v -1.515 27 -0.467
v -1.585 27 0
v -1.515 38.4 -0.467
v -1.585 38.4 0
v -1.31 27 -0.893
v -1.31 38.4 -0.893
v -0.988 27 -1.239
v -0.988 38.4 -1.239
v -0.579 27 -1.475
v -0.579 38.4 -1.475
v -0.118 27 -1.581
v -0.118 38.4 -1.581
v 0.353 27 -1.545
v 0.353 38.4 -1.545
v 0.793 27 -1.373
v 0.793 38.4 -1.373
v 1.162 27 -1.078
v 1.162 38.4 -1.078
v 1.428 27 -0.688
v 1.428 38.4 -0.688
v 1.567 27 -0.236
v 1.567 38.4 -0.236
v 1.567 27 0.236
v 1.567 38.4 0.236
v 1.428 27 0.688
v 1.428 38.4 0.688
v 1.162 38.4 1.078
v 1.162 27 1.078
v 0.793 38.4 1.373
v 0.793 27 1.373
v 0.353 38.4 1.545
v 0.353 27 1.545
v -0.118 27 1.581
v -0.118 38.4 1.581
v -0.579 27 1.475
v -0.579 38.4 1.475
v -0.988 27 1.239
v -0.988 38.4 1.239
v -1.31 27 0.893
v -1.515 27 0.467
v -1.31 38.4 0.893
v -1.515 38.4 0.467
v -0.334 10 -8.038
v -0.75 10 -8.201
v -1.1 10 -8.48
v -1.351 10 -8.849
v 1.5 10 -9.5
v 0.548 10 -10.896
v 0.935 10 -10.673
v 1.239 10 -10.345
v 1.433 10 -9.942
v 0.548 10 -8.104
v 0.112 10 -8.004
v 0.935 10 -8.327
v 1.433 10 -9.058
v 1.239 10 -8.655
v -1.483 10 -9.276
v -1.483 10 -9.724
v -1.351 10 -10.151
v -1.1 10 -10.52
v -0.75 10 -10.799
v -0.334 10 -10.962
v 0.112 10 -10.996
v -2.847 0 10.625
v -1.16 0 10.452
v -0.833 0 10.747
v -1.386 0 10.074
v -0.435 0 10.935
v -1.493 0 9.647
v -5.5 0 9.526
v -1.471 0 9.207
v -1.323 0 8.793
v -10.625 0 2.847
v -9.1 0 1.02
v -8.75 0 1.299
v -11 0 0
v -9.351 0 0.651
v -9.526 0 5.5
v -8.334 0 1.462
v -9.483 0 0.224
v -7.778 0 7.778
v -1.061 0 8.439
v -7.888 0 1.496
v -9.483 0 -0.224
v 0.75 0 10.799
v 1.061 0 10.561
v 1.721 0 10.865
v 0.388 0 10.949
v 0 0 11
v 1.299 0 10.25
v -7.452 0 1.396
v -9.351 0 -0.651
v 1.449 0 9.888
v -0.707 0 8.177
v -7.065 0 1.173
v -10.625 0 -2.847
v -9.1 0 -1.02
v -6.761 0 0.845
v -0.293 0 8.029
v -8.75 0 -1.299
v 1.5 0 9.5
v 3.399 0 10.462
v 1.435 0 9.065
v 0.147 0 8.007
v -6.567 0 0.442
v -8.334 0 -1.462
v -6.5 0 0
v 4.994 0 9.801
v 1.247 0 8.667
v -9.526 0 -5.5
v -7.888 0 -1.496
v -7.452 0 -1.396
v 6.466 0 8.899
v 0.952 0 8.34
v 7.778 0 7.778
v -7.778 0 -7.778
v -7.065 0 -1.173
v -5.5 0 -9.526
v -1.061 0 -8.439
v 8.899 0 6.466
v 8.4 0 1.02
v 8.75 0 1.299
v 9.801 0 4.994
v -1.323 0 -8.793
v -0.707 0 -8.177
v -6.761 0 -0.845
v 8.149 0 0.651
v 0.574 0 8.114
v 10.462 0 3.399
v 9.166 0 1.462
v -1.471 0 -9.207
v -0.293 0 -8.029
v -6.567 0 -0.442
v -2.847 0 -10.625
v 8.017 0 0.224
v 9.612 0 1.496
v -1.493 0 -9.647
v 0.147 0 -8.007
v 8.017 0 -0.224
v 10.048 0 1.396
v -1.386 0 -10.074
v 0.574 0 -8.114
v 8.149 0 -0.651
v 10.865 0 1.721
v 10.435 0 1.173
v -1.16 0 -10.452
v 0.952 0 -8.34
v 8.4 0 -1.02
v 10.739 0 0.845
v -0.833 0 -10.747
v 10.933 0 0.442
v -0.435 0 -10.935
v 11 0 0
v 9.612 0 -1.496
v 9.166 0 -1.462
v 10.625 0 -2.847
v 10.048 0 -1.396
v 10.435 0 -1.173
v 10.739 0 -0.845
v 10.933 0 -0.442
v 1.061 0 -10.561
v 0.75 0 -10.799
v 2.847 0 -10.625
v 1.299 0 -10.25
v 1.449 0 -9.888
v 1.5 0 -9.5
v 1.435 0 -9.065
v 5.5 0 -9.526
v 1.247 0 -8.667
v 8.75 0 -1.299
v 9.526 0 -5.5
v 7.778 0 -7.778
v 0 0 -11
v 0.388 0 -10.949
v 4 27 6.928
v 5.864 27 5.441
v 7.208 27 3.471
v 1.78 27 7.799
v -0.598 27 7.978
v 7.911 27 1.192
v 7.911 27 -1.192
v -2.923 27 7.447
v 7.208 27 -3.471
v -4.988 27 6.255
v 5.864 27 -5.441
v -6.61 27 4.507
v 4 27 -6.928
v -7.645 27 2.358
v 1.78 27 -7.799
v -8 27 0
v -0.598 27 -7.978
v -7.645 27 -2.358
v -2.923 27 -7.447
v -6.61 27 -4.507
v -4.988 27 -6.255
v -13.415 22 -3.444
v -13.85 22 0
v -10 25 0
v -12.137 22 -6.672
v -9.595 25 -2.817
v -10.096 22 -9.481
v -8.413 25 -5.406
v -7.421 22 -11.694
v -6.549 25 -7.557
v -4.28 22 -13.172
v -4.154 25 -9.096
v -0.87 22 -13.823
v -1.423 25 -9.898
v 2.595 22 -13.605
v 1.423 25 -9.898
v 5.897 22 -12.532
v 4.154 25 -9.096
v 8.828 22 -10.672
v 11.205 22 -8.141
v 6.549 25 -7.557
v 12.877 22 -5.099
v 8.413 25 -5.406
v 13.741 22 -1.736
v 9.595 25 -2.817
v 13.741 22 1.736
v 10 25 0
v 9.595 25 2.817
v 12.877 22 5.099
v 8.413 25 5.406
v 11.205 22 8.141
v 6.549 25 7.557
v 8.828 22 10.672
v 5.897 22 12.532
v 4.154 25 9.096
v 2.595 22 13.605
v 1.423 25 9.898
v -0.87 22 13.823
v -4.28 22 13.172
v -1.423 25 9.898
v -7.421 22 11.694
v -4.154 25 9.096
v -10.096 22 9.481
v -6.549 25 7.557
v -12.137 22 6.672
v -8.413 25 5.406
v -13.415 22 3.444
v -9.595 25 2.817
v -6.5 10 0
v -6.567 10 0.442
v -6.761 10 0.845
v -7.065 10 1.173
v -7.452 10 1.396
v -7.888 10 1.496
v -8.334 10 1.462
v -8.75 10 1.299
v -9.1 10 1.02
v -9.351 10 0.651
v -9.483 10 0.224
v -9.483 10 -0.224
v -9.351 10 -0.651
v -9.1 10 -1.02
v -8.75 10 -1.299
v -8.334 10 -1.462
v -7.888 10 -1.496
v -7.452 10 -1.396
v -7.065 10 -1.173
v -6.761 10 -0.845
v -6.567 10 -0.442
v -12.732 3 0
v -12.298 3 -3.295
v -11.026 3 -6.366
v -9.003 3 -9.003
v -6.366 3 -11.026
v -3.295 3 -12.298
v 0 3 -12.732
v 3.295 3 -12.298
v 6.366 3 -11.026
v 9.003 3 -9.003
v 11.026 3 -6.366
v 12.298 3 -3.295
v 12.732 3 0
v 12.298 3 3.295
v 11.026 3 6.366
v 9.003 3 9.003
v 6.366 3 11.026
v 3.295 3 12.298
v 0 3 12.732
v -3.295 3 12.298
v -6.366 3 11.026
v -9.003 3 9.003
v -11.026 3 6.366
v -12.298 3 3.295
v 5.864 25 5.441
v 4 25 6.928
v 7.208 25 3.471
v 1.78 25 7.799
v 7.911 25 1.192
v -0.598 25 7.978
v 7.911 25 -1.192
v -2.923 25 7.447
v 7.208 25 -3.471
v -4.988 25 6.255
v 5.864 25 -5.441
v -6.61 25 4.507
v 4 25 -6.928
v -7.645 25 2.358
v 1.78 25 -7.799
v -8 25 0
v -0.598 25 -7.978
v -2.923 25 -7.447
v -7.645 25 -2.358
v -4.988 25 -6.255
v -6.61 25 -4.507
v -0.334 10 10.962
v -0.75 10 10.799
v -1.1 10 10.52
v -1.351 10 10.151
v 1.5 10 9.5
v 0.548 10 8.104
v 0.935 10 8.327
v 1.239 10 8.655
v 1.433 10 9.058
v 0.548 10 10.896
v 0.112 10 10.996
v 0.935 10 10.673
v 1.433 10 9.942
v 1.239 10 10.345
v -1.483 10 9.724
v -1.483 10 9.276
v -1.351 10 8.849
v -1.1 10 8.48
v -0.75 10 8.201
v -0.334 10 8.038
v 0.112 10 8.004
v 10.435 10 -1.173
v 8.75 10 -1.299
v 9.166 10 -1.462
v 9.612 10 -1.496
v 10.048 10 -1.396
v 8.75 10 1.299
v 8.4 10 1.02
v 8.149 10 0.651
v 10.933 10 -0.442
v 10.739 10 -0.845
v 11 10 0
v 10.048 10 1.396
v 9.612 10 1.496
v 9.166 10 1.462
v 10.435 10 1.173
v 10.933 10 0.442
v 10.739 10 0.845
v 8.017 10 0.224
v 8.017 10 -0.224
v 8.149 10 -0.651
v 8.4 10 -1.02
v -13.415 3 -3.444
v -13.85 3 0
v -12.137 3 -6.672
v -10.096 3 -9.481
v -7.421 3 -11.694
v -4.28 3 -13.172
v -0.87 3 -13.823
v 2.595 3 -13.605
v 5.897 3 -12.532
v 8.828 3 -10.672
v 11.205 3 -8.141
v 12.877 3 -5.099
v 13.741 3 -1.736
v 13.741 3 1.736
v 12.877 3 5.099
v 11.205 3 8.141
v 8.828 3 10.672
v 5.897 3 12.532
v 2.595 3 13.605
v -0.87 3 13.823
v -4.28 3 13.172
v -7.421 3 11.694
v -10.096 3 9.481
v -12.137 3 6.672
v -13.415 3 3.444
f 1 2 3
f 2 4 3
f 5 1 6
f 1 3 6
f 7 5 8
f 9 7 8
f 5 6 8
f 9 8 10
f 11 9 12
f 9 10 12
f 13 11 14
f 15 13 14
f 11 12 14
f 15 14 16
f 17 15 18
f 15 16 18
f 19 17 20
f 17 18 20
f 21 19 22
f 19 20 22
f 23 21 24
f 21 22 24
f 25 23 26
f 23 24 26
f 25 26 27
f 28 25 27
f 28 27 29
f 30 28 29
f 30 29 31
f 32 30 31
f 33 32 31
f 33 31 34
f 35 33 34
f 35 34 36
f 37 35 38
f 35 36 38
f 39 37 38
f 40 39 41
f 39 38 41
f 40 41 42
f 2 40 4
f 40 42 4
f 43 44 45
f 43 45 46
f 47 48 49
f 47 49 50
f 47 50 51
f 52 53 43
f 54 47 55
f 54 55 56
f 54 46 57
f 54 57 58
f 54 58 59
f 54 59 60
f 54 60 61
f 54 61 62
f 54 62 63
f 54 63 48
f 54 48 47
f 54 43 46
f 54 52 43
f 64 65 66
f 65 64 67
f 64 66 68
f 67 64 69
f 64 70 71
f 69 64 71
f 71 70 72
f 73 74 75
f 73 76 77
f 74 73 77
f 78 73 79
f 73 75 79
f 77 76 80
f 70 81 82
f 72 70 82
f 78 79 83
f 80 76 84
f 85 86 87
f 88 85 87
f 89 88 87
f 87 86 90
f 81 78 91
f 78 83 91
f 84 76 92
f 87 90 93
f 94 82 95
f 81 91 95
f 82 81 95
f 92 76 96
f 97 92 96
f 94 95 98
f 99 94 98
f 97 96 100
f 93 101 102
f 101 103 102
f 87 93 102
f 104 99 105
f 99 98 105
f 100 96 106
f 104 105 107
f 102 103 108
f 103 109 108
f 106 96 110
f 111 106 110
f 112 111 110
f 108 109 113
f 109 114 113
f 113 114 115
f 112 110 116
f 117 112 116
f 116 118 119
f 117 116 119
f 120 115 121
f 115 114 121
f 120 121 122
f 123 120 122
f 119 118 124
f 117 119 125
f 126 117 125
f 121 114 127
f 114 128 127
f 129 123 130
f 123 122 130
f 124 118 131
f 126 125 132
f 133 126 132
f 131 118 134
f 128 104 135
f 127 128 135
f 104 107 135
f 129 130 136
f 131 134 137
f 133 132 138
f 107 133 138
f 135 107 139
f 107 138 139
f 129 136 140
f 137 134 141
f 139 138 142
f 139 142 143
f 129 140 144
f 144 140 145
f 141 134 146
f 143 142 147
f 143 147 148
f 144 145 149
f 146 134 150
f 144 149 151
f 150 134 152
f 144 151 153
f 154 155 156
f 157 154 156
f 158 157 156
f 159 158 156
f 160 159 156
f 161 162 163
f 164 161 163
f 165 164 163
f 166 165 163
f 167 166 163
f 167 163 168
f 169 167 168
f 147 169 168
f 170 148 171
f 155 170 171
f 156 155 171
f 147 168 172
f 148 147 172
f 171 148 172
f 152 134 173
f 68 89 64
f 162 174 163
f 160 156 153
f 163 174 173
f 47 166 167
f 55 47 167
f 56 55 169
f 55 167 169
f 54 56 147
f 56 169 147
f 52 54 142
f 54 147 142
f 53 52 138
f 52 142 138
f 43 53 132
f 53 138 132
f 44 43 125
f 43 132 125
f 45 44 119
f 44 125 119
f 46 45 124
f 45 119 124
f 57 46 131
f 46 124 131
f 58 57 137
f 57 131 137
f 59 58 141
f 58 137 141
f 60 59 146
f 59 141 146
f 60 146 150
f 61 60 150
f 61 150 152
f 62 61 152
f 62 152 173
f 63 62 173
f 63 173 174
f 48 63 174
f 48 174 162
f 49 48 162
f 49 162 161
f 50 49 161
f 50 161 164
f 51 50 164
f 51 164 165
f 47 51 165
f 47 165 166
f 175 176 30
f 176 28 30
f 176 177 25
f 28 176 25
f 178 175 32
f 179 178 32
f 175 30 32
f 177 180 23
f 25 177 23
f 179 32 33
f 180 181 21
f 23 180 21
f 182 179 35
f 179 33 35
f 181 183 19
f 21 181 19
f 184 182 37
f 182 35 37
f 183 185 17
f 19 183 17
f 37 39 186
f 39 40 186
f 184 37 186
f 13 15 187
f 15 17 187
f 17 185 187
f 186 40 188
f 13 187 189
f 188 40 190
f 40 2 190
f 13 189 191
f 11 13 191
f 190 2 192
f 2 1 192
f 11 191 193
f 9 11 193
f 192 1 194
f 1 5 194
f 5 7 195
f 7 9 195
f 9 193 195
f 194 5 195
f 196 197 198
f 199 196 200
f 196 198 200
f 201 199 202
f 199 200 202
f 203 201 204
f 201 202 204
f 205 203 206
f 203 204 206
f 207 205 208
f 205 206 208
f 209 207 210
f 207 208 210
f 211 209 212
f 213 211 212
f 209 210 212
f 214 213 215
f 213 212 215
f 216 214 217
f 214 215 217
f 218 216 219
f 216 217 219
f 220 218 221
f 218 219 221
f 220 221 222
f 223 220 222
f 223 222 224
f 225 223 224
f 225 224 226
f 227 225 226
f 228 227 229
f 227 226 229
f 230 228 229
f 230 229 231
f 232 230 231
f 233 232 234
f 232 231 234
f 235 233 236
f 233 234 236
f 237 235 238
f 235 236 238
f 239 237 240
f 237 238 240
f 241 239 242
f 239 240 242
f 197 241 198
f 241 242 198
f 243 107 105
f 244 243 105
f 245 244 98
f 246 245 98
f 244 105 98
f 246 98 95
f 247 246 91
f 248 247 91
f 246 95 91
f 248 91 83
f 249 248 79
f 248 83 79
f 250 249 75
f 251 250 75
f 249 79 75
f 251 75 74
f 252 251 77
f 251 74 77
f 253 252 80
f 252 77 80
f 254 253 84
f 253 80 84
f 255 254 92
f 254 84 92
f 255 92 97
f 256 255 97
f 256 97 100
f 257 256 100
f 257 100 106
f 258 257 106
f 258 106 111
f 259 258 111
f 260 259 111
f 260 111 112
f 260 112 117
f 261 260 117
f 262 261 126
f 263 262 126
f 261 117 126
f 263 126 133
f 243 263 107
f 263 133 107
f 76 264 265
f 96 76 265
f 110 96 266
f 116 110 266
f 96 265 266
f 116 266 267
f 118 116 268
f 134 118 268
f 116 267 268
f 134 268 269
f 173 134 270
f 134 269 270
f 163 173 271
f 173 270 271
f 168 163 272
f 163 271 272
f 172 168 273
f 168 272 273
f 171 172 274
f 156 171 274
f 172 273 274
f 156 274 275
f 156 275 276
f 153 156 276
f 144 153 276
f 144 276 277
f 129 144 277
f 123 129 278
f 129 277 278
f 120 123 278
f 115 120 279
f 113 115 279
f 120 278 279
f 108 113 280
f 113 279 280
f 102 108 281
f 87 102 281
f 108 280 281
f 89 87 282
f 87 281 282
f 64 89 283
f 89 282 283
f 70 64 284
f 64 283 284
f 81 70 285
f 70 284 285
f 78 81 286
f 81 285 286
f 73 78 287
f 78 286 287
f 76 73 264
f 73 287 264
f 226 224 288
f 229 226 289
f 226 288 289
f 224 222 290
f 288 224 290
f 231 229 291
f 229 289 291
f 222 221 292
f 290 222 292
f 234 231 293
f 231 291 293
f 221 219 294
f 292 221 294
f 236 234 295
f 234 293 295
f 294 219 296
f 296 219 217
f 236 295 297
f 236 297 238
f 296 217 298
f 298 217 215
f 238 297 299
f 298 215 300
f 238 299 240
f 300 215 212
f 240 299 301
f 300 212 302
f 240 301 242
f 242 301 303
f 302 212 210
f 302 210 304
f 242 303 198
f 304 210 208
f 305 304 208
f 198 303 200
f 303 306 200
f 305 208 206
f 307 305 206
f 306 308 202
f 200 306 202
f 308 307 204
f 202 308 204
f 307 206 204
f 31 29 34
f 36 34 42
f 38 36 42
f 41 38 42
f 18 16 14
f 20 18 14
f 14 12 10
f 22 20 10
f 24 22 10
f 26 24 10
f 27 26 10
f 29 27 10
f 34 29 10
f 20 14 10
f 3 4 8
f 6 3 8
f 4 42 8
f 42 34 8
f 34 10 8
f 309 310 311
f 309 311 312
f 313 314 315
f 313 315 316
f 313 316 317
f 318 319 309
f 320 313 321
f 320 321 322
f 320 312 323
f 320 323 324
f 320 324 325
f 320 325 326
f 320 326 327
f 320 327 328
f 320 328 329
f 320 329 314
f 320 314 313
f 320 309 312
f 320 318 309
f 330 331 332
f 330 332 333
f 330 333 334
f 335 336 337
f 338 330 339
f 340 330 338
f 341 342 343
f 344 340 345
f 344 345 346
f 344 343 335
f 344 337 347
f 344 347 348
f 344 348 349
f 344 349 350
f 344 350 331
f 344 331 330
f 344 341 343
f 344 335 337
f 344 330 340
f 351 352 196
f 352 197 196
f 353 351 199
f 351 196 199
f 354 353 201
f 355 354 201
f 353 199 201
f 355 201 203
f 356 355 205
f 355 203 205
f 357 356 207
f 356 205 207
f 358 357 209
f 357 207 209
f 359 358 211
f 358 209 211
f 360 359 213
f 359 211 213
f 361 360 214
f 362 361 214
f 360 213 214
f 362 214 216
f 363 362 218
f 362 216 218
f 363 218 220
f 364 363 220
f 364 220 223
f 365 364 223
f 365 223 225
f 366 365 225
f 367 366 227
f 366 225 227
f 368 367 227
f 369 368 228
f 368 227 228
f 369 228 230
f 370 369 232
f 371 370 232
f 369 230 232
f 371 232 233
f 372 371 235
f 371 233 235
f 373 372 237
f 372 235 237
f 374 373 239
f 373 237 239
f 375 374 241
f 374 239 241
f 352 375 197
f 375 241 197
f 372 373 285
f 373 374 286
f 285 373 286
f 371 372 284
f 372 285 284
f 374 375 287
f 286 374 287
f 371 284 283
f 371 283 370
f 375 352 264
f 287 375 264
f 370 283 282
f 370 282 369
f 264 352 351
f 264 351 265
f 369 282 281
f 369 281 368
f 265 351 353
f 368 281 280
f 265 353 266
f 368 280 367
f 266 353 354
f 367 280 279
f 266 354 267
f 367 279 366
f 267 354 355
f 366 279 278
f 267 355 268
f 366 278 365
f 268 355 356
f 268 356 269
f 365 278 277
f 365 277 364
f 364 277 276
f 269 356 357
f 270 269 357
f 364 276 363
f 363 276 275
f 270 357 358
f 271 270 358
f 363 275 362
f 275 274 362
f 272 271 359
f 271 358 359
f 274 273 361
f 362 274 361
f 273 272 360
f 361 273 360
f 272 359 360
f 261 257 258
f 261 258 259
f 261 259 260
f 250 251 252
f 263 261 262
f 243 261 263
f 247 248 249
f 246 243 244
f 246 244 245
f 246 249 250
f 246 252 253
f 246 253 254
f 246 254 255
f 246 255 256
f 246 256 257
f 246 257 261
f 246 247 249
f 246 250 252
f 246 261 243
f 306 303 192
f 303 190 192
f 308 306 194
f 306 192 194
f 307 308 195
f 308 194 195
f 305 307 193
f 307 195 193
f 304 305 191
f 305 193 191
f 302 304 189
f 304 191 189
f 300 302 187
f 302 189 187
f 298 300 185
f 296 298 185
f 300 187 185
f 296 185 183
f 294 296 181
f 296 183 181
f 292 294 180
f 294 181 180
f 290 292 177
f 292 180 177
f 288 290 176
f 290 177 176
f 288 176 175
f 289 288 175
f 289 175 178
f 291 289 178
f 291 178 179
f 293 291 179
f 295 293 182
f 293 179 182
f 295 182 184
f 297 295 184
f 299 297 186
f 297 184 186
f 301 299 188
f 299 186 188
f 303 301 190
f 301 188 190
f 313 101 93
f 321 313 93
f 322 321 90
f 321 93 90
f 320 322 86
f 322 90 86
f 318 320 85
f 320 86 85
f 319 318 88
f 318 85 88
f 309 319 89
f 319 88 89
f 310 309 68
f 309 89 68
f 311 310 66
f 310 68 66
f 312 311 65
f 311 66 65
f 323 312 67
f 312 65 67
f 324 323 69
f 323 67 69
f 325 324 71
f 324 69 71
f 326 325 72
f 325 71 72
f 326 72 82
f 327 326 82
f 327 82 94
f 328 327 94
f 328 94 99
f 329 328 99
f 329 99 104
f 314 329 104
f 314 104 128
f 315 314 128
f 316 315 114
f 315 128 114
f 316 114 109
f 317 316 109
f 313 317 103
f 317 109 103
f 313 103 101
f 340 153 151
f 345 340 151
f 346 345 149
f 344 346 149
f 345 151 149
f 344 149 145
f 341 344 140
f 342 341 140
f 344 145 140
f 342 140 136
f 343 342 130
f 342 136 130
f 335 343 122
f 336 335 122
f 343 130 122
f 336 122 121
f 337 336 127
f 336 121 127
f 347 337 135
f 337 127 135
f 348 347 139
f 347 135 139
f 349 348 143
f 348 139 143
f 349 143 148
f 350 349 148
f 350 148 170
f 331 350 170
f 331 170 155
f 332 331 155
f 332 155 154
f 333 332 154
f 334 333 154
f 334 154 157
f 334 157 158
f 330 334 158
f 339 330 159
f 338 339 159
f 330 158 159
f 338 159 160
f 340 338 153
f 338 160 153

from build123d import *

# Parameters (mm, degrees)
SKETCH3_R          = 1.5
CUT_EXTRUDE1_DEPTH = 10


with BuildPart() as part:
    # Sketch2 → Revolve1 (revolve)
    with BuildSketch(Plane.XY, mode=Mode.PRIVATE) as revolve1_sk:
        Polygon((0, 0), (11, 0), (12.732050808, 3), (13.85, 3), (13.85, 22), (10, 25), (8, 25), (8, 27), (1.585, 27), (1.585, 38.4), (0, 38.4), align=None)
    revolve(revolve1_sk.sketch.rotate(Axis((0, 38.4, 0), (0, -1, 0)), 180), axis=Axis((0, 38.4, 0), (0, -1, 0)))

    # Sketch3 → Cut-Extrude1 (cut)
    with BuildSketch(Plane.XZ):
        with Locations((9.5, 0)):
            Circle(SKETCH3_R)
        with Locations((-8, 0)):
            Circle(SKETCH3_R)
        with Locations((0, 9.5)):
            Circle(SKETCH3_R)
        with Locations((0, -9.5)):
            Circle(SKETCH3_R)
    extrude(amount=-CUT_EXTRUDE1_DEPTH, mode=Mode.SUBTRACT)


solid = part.part
